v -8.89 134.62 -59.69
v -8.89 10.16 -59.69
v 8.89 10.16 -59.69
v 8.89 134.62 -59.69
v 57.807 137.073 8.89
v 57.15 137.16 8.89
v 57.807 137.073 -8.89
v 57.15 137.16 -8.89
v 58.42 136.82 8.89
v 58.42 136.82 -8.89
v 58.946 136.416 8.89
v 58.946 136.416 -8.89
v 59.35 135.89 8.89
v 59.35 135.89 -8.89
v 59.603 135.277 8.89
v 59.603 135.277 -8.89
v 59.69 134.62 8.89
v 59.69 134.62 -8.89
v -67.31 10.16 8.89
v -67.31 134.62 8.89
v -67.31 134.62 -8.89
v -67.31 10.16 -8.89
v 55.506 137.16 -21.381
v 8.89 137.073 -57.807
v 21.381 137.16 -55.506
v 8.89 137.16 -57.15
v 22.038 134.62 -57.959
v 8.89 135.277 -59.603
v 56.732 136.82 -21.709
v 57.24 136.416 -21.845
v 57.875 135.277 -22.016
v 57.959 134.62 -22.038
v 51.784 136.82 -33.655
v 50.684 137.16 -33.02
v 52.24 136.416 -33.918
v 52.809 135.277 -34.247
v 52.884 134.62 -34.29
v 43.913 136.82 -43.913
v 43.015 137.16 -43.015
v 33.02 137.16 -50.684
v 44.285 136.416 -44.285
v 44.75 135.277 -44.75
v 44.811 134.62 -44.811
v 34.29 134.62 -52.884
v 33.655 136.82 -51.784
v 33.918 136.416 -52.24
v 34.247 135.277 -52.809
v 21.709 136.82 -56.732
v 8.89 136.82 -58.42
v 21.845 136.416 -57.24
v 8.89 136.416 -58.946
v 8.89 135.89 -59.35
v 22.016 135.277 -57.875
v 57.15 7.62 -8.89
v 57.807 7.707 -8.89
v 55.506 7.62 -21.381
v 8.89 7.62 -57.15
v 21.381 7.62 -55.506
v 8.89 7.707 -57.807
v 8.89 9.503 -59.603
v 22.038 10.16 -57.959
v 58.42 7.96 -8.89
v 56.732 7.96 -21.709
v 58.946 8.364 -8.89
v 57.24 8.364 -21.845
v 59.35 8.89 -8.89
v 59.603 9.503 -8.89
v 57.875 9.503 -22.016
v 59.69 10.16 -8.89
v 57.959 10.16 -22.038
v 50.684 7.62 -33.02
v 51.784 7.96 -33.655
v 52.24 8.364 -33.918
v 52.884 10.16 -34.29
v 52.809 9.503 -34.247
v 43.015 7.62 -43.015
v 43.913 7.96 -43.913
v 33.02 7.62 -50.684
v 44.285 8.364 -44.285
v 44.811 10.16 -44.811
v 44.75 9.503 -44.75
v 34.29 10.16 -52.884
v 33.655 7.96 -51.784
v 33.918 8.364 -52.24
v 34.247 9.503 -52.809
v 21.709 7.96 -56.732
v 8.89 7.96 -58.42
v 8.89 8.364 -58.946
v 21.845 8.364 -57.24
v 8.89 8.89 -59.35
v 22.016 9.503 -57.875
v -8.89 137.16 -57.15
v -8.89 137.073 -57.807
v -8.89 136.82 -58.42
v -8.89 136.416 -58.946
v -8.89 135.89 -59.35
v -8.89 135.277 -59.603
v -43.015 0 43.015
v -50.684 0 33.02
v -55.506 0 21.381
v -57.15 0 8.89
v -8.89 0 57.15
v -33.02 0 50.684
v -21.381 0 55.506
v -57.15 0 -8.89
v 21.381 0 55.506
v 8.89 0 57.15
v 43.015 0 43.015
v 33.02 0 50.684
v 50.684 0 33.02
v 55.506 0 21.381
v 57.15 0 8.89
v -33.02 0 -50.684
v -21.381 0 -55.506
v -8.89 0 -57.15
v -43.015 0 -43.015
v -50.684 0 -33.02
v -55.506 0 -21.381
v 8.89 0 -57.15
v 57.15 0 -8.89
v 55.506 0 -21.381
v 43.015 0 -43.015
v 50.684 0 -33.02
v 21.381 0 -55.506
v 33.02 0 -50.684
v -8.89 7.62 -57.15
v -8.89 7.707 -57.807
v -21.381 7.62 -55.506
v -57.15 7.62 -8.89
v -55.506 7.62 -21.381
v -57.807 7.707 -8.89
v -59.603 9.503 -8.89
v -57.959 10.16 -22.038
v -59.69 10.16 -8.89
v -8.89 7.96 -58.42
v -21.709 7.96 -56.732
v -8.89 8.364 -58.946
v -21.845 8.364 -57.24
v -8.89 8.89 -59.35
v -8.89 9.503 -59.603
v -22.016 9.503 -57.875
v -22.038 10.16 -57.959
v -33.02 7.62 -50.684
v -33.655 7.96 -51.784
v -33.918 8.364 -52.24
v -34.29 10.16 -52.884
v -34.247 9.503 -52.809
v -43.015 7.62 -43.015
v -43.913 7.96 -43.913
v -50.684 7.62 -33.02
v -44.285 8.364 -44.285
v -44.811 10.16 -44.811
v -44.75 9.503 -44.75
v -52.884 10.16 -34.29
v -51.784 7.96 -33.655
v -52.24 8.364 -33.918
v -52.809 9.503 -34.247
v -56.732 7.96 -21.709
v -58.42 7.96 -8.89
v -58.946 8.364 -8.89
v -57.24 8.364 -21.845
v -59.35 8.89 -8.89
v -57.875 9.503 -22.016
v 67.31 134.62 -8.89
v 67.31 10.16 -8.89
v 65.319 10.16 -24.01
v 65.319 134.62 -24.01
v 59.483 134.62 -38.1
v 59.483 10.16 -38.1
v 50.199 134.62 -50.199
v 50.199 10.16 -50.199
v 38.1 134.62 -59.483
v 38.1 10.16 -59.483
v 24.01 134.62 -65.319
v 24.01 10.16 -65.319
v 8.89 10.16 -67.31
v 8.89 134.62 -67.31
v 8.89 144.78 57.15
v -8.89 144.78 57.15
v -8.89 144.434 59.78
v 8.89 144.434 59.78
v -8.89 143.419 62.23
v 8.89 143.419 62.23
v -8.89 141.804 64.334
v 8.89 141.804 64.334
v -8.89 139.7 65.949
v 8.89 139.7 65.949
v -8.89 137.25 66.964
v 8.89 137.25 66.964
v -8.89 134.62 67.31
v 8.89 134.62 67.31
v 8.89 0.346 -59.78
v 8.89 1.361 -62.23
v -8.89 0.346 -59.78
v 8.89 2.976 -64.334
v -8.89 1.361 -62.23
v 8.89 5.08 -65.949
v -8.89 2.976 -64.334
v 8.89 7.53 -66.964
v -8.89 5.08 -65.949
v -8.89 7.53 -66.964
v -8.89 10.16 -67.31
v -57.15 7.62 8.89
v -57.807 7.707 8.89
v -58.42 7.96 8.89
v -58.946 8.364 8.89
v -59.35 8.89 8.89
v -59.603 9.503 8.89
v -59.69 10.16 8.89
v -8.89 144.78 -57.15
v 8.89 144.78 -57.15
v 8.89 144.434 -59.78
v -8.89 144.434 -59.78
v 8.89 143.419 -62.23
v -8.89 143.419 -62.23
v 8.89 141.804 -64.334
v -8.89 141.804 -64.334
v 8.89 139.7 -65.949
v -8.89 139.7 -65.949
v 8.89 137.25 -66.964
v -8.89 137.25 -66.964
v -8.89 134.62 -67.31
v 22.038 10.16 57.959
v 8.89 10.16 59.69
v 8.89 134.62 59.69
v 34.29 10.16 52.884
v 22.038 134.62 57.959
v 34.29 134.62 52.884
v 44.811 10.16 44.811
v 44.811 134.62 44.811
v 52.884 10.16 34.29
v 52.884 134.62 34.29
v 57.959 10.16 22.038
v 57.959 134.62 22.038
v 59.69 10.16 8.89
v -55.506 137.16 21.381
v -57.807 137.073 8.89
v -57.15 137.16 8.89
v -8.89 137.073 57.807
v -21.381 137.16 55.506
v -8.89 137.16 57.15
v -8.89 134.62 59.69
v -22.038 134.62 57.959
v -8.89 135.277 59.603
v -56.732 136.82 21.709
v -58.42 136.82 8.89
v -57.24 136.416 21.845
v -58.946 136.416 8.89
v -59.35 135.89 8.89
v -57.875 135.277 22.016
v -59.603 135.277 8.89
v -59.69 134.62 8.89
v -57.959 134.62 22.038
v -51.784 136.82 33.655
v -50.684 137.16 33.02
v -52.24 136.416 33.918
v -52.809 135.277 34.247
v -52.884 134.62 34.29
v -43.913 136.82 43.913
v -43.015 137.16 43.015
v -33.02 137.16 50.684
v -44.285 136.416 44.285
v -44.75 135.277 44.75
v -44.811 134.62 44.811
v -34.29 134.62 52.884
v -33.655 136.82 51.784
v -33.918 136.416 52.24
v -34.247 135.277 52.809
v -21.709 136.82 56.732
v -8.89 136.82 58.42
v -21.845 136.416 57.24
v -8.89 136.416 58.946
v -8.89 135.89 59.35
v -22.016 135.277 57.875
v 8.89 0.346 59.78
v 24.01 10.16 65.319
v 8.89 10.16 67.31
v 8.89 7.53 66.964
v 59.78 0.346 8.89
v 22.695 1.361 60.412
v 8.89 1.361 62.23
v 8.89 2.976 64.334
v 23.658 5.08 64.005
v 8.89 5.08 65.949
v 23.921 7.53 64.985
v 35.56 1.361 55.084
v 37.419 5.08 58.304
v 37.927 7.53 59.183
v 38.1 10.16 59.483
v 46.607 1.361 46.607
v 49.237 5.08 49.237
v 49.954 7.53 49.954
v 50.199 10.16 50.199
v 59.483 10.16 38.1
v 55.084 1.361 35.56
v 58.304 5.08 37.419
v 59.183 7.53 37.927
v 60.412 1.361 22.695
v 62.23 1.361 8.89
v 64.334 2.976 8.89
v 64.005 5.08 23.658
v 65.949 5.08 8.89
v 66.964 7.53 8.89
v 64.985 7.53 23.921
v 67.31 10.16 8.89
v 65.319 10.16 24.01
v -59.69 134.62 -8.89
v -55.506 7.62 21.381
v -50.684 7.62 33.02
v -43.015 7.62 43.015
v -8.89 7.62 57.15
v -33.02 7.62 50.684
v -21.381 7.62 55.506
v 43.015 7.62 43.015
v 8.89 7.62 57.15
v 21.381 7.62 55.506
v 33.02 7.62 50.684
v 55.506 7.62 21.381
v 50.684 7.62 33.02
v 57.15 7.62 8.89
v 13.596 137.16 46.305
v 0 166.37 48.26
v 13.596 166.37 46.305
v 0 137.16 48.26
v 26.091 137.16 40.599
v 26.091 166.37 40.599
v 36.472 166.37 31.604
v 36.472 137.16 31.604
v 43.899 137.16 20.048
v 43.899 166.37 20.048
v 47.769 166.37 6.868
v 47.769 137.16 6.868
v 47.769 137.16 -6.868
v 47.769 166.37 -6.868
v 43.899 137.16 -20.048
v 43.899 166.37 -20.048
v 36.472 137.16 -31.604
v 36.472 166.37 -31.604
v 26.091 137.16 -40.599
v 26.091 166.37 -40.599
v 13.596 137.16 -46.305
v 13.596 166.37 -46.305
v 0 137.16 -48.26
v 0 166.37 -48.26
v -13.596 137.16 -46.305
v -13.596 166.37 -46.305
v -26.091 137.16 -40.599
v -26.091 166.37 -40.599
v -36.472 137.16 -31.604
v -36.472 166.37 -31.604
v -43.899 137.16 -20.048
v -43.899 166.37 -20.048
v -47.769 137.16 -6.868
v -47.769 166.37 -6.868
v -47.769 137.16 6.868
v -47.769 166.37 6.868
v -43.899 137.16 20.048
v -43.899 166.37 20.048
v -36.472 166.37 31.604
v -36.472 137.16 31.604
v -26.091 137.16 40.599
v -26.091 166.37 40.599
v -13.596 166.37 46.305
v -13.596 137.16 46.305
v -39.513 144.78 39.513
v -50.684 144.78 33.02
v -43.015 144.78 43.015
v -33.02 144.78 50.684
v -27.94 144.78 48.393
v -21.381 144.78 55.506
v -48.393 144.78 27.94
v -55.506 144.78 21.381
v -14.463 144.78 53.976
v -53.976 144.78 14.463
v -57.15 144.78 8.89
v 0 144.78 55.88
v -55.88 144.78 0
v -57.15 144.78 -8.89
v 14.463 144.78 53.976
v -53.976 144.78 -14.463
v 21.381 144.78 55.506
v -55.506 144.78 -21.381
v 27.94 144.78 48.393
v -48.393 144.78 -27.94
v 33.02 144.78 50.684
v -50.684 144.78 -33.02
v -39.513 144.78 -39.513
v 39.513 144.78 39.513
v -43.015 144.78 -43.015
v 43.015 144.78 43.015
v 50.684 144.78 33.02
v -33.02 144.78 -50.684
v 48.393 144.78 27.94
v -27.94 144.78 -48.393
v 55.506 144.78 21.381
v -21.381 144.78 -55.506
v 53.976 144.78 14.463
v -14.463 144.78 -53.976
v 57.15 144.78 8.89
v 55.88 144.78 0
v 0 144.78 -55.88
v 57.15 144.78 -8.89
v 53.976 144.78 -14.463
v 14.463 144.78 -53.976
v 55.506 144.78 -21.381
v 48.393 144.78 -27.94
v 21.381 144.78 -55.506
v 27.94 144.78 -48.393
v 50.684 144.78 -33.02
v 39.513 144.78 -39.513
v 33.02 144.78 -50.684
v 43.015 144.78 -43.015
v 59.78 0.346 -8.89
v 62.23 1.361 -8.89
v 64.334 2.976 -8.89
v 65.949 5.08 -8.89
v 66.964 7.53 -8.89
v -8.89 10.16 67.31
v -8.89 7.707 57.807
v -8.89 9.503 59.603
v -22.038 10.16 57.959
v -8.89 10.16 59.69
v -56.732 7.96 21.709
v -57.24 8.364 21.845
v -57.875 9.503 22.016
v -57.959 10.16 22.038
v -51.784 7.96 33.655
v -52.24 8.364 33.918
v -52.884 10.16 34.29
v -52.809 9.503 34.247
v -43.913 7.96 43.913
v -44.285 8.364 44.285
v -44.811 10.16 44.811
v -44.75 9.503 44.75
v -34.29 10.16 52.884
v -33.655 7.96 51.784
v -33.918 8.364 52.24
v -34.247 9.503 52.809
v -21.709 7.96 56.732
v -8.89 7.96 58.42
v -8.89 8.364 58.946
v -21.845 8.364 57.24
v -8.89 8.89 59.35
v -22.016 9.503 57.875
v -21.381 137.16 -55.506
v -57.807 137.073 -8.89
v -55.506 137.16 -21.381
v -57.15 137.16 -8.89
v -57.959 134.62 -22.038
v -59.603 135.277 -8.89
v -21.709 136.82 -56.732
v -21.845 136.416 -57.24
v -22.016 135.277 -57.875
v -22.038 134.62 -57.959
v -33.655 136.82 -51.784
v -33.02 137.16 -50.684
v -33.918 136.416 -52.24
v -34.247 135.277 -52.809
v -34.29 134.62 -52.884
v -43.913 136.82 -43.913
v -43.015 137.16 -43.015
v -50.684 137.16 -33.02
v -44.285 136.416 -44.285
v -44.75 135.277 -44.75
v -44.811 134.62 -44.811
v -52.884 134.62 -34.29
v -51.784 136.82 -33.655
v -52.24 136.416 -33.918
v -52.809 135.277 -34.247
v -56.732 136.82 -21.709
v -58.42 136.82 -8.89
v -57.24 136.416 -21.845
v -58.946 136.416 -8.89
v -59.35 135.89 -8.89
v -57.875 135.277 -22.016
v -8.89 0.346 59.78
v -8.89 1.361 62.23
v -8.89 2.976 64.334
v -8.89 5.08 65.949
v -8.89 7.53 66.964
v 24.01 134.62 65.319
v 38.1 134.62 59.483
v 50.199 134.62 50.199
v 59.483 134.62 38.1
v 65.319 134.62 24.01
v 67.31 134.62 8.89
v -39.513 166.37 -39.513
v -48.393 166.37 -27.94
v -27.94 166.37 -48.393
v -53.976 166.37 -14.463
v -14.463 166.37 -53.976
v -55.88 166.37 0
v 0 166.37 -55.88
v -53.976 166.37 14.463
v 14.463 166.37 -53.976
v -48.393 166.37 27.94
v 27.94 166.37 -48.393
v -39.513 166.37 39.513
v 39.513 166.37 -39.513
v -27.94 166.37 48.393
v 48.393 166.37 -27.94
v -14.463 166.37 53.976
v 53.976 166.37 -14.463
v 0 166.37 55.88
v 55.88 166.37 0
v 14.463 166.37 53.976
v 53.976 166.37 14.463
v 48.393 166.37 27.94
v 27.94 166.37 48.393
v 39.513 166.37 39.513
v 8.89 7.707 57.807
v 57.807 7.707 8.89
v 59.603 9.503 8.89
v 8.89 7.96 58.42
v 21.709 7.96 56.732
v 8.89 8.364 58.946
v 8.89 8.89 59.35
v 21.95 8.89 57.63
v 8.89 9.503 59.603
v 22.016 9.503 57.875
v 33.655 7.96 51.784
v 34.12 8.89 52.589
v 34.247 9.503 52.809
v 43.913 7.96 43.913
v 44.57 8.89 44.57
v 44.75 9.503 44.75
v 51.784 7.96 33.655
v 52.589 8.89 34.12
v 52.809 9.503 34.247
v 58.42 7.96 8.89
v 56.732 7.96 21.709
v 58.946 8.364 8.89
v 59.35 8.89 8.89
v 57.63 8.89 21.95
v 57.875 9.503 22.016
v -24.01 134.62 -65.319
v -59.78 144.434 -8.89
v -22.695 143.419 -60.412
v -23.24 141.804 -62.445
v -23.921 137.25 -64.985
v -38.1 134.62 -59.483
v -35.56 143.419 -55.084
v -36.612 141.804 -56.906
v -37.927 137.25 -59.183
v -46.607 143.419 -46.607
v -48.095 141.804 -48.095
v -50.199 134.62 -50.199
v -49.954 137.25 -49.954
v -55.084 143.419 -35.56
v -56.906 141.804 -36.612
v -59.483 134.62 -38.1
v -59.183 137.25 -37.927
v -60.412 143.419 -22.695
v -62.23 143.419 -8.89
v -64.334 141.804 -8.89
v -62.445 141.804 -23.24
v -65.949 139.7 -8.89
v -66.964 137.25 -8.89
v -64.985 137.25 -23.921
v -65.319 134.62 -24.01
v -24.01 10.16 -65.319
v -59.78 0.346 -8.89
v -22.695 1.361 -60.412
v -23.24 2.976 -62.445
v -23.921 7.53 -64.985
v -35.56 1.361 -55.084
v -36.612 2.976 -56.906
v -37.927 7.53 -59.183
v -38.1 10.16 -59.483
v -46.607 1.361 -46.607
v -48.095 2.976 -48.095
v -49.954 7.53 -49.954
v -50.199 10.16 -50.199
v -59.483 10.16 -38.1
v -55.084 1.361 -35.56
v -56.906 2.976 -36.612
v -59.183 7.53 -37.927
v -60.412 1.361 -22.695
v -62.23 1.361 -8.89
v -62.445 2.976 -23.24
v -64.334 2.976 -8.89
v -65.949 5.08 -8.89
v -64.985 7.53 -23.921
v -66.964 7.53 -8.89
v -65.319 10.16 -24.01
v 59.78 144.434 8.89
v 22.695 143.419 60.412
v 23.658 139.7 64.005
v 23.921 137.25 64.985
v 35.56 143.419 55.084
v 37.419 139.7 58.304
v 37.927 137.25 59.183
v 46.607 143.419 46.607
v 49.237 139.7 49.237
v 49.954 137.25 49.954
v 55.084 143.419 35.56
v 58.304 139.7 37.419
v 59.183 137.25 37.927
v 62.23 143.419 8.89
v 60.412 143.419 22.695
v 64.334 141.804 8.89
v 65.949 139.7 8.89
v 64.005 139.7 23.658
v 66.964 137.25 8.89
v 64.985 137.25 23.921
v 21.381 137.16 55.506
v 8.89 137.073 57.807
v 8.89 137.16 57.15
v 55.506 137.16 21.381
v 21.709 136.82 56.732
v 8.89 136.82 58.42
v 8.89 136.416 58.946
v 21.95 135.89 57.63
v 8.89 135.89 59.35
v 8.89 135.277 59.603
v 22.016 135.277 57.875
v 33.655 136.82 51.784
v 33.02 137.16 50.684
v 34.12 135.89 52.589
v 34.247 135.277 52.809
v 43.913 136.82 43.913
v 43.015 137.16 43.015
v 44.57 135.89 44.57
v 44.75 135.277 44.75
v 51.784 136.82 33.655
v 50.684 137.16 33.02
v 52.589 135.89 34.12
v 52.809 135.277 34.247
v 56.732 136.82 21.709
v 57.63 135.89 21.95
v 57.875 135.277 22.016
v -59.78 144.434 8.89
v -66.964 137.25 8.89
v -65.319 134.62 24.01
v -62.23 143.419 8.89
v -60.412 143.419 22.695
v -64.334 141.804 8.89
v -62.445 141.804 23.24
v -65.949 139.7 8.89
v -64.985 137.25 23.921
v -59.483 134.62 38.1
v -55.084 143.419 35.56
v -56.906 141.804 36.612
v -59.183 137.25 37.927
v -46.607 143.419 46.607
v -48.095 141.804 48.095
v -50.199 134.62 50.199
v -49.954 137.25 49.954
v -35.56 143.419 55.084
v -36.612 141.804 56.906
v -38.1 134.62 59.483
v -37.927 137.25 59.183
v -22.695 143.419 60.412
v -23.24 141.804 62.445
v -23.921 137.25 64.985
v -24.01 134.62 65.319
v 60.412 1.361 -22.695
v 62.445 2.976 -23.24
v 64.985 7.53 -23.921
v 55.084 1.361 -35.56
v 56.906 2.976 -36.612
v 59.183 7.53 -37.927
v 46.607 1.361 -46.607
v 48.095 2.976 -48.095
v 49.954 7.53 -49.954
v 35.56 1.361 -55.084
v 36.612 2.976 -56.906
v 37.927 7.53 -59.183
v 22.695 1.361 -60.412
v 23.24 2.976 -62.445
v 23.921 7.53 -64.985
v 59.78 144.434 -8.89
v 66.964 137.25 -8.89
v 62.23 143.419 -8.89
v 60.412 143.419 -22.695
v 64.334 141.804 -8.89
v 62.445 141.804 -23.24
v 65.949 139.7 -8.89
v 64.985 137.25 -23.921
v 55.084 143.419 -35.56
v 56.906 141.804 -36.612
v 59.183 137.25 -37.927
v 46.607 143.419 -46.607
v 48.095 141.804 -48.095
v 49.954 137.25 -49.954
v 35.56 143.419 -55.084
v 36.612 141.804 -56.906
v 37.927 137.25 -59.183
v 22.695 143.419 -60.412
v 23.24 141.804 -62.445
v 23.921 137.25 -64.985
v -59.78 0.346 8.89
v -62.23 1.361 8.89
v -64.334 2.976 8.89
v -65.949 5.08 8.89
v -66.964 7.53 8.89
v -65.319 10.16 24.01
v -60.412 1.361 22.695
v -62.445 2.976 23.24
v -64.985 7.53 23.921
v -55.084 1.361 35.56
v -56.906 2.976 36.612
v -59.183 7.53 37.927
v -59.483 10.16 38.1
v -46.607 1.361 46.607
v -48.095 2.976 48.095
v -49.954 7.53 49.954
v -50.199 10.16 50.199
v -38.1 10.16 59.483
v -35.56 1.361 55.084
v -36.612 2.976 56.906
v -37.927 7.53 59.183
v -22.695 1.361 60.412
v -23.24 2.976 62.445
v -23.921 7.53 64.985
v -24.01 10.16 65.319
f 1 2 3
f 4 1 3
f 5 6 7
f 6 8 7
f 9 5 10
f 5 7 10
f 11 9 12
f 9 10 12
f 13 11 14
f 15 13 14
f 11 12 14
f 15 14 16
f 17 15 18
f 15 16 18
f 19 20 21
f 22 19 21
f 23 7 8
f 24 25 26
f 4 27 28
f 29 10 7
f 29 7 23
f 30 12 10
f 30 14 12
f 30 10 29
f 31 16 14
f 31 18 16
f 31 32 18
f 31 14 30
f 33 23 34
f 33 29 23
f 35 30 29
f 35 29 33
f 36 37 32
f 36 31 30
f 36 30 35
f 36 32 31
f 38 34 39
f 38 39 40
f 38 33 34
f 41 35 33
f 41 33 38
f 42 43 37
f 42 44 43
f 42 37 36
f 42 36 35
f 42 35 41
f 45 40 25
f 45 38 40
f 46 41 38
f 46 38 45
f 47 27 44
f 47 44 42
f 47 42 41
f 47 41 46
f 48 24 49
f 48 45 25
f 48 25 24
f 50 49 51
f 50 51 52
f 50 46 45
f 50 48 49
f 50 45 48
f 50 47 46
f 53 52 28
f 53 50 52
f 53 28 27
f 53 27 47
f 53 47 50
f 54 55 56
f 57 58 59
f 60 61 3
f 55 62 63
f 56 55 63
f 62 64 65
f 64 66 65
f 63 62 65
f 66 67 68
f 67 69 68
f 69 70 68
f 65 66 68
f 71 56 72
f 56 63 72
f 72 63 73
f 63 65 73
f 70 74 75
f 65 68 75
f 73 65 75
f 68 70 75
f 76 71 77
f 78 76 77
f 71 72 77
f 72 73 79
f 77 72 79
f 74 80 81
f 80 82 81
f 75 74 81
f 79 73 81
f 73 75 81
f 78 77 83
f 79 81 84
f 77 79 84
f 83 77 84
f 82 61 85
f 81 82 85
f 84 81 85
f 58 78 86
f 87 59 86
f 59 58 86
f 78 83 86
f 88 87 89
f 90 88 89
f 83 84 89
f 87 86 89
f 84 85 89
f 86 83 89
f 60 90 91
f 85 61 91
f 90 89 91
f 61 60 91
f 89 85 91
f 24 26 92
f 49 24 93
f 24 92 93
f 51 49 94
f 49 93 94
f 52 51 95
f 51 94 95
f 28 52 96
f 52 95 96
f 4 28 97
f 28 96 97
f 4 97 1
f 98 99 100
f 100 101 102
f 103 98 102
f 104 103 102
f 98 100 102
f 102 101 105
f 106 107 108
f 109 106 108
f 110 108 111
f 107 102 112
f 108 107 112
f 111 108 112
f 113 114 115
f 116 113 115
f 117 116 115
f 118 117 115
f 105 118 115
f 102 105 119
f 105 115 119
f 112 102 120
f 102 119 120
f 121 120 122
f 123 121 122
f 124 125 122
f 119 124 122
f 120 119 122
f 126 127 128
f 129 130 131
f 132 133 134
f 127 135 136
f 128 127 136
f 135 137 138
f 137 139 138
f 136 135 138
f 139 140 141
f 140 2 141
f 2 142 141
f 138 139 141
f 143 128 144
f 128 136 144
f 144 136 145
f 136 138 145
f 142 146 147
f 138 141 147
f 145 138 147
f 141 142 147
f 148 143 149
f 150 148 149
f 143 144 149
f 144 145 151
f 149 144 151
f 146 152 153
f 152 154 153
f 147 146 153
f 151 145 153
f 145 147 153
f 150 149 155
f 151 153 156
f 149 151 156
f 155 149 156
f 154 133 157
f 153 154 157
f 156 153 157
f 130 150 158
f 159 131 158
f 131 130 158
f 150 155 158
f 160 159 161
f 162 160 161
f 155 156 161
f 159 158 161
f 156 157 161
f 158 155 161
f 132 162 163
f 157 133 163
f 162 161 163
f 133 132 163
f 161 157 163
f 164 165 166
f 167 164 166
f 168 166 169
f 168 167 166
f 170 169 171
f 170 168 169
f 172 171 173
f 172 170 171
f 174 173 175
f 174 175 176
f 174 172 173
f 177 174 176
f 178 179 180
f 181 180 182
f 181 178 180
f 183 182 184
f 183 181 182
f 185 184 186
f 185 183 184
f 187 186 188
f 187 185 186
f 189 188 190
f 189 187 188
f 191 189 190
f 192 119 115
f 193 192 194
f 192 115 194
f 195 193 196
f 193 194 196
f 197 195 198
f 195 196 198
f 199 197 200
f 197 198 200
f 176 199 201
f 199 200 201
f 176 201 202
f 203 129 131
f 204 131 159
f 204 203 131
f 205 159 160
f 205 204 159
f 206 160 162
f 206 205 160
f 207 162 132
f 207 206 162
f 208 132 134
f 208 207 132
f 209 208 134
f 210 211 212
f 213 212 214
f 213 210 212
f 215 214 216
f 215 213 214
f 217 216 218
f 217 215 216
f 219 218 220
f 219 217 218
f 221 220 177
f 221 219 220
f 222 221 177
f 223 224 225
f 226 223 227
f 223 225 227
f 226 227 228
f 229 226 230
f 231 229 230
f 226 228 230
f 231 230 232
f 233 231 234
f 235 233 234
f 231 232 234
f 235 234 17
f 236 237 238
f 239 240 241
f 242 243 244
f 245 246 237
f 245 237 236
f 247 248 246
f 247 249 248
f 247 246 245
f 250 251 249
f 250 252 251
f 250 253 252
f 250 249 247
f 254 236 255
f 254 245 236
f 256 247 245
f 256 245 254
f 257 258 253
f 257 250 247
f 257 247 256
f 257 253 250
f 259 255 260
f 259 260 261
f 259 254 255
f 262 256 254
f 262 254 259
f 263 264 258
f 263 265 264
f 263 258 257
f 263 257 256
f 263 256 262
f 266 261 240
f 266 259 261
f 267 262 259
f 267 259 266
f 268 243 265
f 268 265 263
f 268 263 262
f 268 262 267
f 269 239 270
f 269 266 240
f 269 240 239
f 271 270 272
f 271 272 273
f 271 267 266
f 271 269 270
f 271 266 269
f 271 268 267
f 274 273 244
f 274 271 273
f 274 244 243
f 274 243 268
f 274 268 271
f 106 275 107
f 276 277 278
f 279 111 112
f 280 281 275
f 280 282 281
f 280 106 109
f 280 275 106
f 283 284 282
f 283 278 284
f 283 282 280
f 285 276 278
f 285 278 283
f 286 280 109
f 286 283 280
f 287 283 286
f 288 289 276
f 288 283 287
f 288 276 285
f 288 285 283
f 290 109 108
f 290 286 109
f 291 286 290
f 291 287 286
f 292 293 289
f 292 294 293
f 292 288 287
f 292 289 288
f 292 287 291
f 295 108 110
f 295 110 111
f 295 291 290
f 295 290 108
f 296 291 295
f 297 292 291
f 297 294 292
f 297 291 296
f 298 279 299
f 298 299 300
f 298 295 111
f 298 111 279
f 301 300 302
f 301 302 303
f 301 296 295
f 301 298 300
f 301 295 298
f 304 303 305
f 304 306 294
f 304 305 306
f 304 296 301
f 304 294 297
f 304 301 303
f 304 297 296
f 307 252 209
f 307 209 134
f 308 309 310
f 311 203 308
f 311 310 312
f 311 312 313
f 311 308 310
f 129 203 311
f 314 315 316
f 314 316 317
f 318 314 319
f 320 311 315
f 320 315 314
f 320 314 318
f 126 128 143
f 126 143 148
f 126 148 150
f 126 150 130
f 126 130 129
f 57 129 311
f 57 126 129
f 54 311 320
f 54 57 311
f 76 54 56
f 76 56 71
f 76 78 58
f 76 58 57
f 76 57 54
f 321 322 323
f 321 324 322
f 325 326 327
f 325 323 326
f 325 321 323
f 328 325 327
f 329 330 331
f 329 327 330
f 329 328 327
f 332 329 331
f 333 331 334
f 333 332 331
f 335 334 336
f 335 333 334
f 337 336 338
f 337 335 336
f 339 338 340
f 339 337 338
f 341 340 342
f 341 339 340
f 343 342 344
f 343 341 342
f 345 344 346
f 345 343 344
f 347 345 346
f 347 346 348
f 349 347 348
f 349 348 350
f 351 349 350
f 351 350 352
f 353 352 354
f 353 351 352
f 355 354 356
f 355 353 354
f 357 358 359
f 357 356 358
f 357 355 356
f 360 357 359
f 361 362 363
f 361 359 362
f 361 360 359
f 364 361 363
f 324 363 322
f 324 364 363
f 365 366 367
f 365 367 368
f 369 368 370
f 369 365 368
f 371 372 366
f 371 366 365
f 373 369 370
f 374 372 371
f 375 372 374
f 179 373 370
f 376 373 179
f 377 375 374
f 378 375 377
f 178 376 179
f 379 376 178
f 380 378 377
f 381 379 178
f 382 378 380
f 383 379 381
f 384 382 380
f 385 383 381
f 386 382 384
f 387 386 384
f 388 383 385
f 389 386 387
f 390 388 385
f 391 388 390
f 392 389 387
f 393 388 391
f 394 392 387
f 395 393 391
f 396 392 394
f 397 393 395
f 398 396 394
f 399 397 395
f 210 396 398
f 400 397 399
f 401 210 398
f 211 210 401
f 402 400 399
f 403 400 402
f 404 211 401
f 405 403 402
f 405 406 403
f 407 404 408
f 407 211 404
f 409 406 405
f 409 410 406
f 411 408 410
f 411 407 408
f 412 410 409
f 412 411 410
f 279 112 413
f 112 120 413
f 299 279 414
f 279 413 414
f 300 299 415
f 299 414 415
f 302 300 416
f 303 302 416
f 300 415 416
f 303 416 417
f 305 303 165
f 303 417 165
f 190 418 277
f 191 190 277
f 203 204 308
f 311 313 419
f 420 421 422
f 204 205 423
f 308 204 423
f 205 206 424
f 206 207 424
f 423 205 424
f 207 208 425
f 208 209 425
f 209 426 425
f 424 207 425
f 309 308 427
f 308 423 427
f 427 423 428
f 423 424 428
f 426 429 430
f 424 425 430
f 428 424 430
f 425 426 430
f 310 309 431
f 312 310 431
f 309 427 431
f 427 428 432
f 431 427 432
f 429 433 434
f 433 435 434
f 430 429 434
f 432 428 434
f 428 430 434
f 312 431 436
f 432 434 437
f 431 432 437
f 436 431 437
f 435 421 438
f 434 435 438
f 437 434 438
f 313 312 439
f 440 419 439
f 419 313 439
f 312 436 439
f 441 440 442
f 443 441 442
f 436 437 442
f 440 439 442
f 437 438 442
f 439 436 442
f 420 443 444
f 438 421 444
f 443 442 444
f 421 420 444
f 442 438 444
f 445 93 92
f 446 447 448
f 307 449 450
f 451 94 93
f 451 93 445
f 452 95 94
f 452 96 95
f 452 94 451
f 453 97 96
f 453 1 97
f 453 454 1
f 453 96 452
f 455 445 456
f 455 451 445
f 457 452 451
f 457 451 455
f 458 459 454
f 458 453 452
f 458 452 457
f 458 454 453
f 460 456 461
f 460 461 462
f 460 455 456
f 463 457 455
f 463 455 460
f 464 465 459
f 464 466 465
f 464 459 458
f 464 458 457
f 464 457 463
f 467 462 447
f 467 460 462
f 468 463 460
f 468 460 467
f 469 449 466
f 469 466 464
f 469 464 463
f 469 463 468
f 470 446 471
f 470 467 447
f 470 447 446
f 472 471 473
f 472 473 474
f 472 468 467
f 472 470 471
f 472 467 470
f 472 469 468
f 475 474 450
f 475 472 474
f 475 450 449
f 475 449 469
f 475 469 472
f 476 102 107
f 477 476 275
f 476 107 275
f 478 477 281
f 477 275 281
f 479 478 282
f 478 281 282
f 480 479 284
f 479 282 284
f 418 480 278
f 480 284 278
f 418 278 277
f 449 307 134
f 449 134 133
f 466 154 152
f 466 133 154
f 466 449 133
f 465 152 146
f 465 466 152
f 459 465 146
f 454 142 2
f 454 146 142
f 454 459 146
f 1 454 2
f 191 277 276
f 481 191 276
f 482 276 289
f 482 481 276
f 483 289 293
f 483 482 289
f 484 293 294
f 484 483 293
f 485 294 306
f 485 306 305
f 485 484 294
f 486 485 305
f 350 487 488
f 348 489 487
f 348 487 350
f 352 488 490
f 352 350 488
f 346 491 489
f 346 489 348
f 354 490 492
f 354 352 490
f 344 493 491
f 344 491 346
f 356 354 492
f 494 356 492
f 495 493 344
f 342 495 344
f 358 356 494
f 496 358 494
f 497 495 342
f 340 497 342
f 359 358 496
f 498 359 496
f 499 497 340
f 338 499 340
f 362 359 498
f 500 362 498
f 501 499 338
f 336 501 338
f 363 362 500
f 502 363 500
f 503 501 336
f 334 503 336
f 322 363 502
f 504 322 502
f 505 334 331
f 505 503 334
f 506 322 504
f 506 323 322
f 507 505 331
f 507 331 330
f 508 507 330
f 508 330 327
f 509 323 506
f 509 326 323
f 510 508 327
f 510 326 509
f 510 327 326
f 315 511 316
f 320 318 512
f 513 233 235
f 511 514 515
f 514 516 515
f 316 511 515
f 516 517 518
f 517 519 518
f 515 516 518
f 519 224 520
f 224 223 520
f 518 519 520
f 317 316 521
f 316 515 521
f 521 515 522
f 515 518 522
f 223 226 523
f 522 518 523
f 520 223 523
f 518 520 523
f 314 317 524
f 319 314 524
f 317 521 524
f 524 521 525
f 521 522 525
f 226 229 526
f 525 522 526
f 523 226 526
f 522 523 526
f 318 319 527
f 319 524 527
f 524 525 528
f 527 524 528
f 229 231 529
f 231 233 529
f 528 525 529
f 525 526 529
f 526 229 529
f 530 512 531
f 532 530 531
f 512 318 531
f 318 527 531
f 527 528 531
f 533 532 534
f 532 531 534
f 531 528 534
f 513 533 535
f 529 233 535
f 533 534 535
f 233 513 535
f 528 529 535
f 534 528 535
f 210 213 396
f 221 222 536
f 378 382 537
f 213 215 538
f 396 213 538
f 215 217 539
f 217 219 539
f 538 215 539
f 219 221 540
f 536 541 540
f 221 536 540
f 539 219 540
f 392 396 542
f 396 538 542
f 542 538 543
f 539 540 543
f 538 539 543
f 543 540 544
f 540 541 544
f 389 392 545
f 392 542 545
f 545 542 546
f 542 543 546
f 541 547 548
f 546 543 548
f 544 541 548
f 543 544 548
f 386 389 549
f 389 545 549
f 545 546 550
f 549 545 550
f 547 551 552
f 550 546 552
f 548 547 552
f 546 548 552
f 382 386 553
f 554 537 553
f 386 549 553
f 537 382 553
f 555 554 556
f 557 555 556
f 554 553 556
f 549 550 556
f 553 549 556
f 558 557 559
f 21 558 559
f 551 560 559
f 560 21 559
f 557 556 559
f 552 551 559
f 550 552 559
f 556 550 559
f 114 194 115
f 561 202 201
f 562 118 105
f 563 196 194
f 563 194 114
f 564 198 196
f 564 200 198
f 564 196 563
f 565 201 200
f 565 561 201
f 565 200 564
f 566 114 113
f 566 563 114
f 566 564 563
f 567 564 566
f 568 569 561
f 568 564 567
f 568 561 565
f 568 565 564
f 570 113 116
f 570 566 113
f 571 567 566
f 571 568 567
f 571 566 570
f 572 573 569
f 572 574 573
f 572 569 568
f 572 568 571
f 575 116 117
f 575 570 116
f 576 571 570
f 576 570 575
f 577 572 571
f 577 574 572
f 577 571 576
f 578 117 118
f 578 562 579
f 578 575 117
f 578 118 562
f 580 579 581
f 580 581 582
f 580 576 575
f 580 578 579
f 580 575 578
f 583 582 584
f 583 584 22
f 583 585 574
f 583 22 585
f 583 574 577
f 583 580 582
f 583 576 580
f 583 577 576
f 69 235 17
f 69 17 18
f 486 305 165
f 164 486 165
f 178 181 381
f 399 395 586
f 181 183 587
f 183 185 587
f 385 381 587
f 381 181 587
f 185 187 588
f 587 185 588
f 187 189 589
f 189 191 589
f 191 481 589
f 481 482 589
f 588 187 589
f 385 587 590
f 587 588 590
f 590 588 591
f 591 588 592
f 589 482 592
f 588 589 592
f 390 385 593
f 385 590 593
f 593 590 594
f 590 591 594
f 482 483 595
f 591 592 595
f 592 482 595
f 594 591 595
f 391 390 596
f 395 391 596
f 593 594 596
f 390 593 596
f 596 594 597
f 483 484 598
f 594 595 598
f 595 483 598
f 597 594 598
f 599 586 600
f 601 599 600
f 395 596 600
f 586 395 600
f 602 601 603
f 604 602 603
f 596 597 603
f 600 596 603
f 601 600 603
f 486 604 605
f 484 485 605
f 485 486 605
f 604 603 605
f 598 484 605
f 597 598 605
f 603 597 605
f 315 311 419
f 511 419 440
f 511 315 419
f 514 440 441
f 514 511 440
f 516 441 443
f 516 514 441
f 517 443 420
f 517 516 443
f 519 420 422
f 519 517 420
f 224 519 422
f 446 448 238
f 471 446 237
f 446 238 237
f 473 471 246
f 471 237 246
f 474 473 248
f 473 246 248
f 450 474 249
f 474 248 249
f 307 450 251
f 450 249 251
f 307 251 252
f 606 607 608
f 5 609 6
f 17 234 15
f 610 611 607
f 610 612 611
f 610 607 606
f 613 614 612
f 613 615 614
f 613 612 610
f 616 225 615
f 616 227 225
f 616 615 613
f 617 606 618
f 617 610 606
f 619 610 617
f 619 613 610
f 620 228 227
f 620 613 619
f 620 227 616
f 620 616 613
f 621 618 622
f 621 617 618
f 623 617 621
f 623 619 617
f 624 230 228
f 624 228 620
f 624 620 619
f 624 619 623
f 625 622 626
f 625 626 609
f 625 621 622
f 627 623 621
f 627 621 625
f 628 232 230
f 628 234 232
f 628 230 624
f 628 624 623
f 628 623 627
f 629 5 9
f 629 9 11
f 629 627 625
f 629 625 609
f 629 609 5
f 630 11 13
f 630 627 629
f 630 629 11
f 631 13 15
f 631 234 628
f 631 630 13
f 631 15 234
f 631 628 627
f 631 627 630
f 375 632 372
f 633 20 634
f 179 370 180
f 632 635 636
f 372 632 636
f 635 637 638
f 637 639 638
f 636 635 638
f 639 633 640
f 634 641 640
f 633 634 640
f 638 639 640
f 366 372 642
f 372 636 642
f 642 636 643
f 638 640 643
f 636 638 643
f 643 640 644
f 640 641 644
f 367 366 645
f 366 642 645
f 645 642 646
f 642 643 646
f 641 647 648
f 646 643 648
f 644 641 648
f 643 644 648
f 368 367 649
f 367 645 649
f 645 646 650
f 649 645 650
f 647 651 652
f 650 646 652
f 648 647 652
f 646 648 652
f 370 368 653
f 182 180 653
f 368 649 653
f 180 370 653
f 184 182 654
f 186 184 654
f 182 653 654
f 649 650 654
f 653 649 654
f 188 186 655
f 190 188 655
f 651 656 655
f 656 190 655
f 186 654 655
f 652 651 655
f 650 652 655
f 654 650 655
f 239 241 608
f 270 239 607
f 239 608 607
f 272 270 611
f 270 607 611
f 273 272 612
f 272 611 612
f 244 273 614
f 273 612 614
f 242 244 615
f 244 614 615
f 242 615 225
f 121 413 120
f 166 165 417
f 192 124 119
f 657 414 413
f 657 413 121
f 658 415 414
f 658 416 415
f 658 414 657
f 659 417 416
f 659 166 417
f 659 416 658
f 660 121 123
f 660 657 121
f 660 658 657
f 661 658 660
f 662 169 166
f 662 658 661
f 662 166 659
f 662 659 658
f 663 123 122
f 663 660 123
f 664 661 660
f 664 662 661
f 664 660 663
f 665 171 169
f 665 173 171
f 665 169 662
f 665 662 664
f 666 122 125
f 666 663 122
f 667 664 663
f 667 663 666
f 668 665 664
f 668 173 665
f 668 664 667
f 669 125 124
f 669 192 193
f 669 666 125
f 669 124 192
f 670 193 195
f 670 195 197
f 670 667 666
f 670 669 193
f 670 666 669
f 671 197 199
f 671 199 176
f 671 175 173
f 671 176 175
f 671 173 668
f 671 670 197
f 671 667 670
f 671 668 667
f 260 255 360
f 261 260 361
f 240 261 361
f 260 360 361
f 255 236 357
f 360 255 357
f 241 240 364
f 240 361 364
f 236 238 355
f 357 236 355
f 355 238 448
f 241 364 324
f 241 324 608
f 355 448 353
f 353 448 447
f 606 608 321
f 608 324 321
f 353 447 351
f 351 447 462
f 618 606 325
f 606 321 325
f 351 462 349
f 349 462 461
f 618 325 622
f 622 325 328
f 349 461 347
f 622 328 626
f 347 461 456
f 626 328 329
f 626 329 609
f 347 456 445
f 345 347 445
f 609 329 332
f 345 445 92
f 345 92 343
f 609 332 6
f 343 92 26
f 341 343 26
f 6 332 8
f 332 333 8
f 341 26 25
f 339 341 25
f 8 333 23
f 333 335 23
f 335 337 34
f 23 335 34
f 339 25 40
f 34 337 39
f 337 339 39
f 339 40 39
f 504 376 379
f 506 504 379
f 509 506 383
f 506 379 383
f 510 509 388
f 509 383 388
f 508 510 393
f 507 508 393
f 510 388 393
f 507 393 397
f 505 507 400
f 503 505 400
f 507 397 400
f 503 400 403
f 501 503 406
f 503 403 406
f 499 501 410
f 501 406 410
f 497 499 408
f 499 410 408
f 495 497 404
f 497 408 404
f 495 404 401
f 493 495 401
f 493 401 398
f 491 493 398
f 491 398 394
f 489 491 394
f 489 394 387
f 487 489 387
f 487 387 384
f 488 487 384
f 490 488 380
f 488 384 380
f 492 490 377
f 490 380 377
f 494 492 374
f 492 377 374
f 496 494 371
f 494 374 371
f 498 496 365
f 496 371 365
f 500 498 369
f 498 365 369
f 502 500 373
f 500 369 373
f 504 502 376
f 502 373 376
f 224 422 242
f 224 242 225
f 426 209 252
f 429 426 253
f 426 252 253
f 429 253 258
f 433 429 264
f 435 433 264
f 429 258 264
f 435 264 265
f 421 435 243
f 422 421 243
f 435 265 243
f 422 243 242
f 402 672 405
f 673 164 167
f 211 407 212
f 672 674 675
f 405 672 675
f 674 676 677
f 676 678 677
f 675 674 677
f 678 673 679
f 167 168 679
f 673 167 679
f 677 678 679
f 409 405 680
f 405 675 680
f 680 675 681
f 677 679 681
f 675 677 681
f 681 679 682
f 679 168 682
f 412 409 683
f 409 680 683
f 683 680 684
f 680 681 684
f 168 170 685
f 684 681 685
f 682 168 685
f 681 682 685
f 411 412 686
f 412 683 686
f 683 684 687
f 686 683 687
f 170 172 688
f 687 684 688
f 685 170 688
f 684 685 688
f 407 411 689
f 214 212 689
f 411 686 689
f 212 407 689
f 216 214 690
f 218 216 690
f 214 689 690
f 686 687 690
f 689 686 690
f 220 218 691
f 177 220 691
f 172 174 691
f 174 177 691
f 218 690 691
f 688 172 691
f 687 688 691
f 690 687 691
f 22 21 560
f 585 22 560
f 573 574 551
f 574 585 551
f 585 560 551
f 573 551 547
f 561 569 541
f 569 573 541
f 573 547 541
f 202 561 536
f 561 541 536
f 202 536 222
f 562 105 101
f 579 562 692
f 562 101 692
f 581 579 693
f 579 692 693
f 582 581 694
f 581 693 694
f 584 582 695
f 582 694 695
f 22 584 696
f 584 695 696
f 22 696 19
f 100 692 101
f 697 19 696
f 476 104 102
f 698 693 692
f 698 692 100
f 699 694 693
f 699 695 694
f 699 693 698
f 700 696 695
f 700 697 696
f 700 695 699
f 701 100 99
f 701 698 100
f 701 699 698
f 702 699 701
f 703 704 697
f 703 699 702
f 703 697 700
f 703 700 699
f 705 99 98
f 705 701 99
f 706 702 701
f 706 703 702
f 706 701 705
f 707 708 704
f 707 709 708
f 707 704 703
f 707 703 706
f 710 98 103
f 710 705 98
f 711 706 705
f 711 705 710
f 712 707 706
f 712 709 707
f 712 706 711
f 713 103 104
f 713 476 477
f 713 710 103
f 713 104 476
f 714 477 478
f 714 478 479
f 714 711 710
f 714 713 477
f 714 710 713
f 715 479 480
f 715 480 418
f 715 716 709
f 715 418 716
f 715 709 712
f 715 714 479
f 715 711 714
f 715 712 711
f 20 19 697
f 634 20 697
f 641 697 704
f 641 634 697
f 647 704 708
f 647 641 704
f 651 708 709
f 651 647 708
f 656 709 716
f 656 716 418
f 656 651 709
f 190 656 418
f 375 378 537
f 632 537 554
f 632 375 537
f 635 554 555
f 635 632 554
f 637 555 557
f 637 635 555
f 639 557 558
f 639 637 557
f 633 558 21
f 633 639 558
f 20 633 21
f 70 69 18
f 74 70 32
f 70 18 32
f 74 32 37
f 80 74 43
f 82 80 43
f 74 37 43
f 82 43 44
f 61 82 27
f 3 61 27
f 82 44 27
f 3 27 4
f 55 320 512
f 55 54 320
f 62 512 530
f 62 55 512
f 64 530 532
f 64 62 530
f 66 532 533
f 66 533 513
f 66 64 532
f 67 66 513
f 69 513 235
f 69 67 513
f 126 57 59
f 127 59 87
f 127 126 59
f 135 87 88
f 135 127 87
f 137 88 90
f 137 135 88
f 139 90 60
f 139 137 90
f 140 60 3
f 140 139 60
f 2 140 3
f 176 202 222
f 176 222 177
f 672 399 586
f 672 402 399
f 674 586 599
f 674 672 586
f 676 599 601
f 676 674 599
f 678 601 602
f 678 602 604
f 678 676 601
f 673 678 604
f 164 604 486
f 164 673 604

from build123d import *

# Parameters (mm, degrees)
SKETCH1_W           = 134.62
SKETCH1_H           = 134.62
BOSS_EXTRUDE1_DEPTH = 144.78
FILLET1_R           = 58.42
FILLET2_R           = 10.16
SKETCH2_R           = 55.88
BOSS_EXTRUDE2_DEPTH = 21.59
SHELL1_T            = -7.62


with BuildPart() as part:
    # Sketch1 → Boss-Extrude1 (new body)
    with BuildSketch(Plane(origin=(0, 0, 0), x_dir=(1, 0, 0), z_dir=(0, 1, 0))):
        Rectangle(SKETCH1_W, SKETCH1_H)
    extrude(amount=BOSS_EXTRUDE1_DEPTH)

    # Fillet1
    fillet1_edges = [part.edges().sort_by_distance(p)[0] for p in [
        (67.31, 72.39, 67.31),
        (-67.31, 72.39, 67.31),
        (-67.31, 72.39, -67.31),
        (67.31, 72.39, -67.31),
    ]]
    fillet(fillet1_edges, radius=FILLET1_R)

    # Fillet2
    fillet2_edges = [part.edges().sort_by_distance(p)[0] for p in [
        (67.31, 0, 0),
        (67.31, 144.78, 0),
        (0, 0, 67.31),
        (-67.31, 0, 0),
        (0, 0, -67.31),
        (-50.199178157, 0, -50.199178157),
        (50.199178157, 0, -50.199178157),
        (-50.199178157, 0, 50.199178157),
        (50.199178157, 0, 50.199178157),
        (0, 144.78, 67.31),
        (0, 144.78, -67.31),
        (-67.31, 144.78, 0),
        (-50.199178157, 144.78, -50.199178157),
        (50.199178157, 144.78, -50.199178157),
        (-50.199178157, 144.78, 50.199178157),
        (50.199178157, 144.78, 50.199178157),
    ]]
    fillet(fillet2_edges, radius=FILLET2_R)

    # Sketch2 → Boss-Extrude2 (add)
    with BuildSketch(Plane(origin=(0, 144.78, 0), x_dir=(1, 0, 0), z_dir=(0, 1, 0))):
        with Locations(Location((0, 0, 0), (0, 0, 270))):
            Circle(SKETCH2_R)
    extrude(amount=BOSS_EXTRUDE2_DEPTH)

    # Shell1
    shell1_openings = [part.faces().sort_by_distance(p)[0] for p in [
        (0, 166.37, 0),
    ]]
    offset(amount=SHELL1_T, openings=shell1_openings, kind=Kind.INTERSECTION)


solid = part.part
